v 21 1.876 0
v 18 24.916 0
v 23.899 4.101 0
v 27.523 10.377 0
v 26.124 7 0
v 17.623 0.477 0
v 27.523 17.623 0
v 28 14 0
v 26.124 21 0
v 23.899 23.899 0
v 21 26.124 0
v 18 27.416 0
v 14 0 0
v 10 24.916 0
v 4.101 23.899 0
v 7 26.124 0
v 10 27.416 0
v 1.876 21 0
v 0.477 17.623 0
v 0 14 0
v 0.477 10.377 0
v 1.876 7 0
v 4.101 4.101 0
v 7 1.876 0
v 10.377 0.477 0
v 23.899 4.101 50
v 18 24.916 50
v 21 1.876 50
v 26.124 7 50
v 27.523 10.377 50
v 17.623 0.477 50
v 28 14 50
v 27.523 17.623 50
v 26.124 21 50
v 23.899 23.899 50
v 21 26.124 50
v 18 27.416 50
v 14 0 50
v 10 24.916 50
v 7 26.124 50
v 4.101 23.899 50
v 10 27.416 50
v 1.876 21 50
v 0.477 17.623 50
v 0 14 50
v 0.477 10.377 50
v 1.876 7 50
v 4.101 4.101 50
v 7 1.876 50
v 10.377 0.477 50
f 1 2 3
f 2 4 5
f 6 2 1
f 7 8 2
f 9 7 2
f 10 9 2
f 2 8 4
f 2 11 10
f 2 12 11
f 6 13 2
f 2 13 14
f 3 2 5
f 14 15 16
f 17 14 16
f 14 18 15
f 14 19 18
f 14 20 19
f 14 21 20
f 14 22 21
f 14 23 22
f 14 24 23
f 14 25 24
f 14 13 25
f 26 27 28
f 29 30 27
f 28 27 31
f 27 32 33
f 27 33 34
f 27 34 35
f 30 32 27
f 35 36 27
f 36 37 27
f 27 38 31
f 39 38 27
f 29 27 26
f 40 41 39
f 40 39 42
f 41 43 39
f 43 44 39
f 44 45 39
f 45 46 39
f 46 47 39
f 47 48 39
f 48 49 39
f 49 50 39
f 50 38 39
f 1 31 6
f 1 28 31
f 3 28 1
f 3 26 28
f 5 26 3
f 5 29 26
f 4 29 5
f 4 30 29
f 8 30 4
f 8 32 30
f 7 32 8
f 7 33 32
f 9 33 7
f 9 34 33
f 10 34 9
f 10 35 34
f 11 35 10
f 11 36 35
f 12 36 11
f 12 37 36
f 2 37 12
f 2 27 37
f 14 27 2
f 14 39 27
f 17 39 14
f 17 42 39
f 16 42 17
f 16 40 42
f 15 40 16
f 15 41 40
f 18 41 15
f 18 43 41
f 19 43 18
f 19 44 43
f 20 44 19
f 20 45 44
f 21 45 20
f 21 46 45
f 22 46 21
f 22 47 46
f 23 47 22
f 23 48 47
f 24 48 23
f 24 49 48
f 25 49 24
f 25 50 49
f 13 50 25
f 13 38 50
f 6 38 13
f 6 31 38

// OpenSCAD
$fn = 32;

// ----------------------------------------------------------------------
// Keyway shaft: d28 shaft, key 8 x 2.5 mm
// ----------------------------------------------------------------------

// --- parameters (mm) ---
shaft_r = 14;             // shaft radius
key_w = 8;                // keyway width
key_d = 2.5;              // keyway depth below the surface line
plate_t = 50;             // shaft length, Z (extrusion height)

shaft_d = 2 * shaft_r;  // shaft diameter
circle_step = 15;  // polygon sampling step, degrees

profile = [[7, 26.124], [4.101, 23.899], [1.876, 21], [0.477, 17.623], [0, 14], [0.477, 10.377], [1.876, 7], [4.101, 4.101], [7, 1.876], [10.377, 0.477], [14, 0], [17.623, 0.477], [21, 1.876], [23.899, 4.101], [26.124, 7], [27.523, 10.377], [28, 14], [27.523, 17.623], [26.124, 21], [23.899, 23.899], [21, 26.124], [18, 27.416], [18, 24.916], [10, 24.916], [10, 27.416]];  // primary outline, 25 points, counter clockwise

// --- the one profile operation ---
linear_extrude(height = plate_t) polygon(points = profile);
